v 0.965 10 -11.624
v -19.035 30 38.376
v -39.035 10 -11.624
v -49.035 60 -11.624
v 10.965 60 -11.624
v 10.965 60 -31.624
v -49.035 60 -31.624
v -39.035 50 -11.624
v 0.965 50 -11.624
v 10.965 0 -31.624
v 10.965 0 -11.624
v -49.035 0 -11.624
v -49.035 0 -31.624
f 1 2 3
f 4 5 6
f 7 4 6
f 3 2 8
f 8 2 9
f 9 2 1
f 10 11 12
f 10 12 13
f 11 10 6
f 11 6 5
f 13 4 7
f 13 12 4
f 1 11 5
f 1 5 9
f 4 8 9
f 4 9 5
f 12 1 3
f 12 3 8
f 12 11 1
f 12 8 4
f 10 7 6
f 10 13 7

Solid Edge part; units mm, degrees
sketch "Sketch1" plane through (0, 0, 0) normal (0, -1, 0) x (1, 0, 0)
  line L0 (10.9652, -11.6239) -> (-49.0348, -11.6239)
  line L1 (-49.0348, -11.6239) -> (-49.0348, -31.6239)
  line L2 (-49.0348, -31.6239) -> (10.9652, -31.6239)
  line L3 (10.9652, -31.6239) -> (10.9652, -11.6239)
extrude "Protrusion1" add sketch "Sketch1" against normal blind 60
sketch "Sketch2" plane through (-19.0348, 30, -11.6239) normal (0, 0, 1) x (1, 0, 0)
  line L0 (-20, -20) -> (20, -20)
  line L1 (20, -20) -> (20, 20)
  line L2 (20, 20) -> (-20, 20)
  line L3 (-20, 20) -> (-20, -20)
extrude "ExtrudedProtrusion_2" add sketch "Sketch2" along normal blind 50
sketch "Sketch3" plane through (-19.0348, 10, 13.3761) normal (0, -1, 0) x (1, 0, 0)
  line L0 (0, 25) -> (-20, -25)
  line L1 (-20, -25) -> (-20, 25)
  line L2 (-20, 25) -> (0, 25)
  line L3 (20, 25) -> (0, 25)
  line L4 (0, 25) -> (20, -25)
  line L5 (20, -25) -> (20, 25)
extrude "ExtrudedCutout_1" cut sketch "Sketch3" against normal blind 103.1734
sketch "Sketch4" plane through (10.9652, 30, -21.6239) normal (1, 0, 0) x (0, 1, 0)
  line L0 (0, 60) -> (-20, 10)
  line L1 (-20, 10) -> (-20, 60)
  line L2 (-20, 60) -> (0, 60)
  line L3 (0, 60) -> (20, 10)
  line L4 (20, 10) -> (20, 60)
  line L5 (20, 60) -> (0, 60)
extrude "ExtrudedCutout_2" cut sketch "Sketch4" against normal blind 271.3567
